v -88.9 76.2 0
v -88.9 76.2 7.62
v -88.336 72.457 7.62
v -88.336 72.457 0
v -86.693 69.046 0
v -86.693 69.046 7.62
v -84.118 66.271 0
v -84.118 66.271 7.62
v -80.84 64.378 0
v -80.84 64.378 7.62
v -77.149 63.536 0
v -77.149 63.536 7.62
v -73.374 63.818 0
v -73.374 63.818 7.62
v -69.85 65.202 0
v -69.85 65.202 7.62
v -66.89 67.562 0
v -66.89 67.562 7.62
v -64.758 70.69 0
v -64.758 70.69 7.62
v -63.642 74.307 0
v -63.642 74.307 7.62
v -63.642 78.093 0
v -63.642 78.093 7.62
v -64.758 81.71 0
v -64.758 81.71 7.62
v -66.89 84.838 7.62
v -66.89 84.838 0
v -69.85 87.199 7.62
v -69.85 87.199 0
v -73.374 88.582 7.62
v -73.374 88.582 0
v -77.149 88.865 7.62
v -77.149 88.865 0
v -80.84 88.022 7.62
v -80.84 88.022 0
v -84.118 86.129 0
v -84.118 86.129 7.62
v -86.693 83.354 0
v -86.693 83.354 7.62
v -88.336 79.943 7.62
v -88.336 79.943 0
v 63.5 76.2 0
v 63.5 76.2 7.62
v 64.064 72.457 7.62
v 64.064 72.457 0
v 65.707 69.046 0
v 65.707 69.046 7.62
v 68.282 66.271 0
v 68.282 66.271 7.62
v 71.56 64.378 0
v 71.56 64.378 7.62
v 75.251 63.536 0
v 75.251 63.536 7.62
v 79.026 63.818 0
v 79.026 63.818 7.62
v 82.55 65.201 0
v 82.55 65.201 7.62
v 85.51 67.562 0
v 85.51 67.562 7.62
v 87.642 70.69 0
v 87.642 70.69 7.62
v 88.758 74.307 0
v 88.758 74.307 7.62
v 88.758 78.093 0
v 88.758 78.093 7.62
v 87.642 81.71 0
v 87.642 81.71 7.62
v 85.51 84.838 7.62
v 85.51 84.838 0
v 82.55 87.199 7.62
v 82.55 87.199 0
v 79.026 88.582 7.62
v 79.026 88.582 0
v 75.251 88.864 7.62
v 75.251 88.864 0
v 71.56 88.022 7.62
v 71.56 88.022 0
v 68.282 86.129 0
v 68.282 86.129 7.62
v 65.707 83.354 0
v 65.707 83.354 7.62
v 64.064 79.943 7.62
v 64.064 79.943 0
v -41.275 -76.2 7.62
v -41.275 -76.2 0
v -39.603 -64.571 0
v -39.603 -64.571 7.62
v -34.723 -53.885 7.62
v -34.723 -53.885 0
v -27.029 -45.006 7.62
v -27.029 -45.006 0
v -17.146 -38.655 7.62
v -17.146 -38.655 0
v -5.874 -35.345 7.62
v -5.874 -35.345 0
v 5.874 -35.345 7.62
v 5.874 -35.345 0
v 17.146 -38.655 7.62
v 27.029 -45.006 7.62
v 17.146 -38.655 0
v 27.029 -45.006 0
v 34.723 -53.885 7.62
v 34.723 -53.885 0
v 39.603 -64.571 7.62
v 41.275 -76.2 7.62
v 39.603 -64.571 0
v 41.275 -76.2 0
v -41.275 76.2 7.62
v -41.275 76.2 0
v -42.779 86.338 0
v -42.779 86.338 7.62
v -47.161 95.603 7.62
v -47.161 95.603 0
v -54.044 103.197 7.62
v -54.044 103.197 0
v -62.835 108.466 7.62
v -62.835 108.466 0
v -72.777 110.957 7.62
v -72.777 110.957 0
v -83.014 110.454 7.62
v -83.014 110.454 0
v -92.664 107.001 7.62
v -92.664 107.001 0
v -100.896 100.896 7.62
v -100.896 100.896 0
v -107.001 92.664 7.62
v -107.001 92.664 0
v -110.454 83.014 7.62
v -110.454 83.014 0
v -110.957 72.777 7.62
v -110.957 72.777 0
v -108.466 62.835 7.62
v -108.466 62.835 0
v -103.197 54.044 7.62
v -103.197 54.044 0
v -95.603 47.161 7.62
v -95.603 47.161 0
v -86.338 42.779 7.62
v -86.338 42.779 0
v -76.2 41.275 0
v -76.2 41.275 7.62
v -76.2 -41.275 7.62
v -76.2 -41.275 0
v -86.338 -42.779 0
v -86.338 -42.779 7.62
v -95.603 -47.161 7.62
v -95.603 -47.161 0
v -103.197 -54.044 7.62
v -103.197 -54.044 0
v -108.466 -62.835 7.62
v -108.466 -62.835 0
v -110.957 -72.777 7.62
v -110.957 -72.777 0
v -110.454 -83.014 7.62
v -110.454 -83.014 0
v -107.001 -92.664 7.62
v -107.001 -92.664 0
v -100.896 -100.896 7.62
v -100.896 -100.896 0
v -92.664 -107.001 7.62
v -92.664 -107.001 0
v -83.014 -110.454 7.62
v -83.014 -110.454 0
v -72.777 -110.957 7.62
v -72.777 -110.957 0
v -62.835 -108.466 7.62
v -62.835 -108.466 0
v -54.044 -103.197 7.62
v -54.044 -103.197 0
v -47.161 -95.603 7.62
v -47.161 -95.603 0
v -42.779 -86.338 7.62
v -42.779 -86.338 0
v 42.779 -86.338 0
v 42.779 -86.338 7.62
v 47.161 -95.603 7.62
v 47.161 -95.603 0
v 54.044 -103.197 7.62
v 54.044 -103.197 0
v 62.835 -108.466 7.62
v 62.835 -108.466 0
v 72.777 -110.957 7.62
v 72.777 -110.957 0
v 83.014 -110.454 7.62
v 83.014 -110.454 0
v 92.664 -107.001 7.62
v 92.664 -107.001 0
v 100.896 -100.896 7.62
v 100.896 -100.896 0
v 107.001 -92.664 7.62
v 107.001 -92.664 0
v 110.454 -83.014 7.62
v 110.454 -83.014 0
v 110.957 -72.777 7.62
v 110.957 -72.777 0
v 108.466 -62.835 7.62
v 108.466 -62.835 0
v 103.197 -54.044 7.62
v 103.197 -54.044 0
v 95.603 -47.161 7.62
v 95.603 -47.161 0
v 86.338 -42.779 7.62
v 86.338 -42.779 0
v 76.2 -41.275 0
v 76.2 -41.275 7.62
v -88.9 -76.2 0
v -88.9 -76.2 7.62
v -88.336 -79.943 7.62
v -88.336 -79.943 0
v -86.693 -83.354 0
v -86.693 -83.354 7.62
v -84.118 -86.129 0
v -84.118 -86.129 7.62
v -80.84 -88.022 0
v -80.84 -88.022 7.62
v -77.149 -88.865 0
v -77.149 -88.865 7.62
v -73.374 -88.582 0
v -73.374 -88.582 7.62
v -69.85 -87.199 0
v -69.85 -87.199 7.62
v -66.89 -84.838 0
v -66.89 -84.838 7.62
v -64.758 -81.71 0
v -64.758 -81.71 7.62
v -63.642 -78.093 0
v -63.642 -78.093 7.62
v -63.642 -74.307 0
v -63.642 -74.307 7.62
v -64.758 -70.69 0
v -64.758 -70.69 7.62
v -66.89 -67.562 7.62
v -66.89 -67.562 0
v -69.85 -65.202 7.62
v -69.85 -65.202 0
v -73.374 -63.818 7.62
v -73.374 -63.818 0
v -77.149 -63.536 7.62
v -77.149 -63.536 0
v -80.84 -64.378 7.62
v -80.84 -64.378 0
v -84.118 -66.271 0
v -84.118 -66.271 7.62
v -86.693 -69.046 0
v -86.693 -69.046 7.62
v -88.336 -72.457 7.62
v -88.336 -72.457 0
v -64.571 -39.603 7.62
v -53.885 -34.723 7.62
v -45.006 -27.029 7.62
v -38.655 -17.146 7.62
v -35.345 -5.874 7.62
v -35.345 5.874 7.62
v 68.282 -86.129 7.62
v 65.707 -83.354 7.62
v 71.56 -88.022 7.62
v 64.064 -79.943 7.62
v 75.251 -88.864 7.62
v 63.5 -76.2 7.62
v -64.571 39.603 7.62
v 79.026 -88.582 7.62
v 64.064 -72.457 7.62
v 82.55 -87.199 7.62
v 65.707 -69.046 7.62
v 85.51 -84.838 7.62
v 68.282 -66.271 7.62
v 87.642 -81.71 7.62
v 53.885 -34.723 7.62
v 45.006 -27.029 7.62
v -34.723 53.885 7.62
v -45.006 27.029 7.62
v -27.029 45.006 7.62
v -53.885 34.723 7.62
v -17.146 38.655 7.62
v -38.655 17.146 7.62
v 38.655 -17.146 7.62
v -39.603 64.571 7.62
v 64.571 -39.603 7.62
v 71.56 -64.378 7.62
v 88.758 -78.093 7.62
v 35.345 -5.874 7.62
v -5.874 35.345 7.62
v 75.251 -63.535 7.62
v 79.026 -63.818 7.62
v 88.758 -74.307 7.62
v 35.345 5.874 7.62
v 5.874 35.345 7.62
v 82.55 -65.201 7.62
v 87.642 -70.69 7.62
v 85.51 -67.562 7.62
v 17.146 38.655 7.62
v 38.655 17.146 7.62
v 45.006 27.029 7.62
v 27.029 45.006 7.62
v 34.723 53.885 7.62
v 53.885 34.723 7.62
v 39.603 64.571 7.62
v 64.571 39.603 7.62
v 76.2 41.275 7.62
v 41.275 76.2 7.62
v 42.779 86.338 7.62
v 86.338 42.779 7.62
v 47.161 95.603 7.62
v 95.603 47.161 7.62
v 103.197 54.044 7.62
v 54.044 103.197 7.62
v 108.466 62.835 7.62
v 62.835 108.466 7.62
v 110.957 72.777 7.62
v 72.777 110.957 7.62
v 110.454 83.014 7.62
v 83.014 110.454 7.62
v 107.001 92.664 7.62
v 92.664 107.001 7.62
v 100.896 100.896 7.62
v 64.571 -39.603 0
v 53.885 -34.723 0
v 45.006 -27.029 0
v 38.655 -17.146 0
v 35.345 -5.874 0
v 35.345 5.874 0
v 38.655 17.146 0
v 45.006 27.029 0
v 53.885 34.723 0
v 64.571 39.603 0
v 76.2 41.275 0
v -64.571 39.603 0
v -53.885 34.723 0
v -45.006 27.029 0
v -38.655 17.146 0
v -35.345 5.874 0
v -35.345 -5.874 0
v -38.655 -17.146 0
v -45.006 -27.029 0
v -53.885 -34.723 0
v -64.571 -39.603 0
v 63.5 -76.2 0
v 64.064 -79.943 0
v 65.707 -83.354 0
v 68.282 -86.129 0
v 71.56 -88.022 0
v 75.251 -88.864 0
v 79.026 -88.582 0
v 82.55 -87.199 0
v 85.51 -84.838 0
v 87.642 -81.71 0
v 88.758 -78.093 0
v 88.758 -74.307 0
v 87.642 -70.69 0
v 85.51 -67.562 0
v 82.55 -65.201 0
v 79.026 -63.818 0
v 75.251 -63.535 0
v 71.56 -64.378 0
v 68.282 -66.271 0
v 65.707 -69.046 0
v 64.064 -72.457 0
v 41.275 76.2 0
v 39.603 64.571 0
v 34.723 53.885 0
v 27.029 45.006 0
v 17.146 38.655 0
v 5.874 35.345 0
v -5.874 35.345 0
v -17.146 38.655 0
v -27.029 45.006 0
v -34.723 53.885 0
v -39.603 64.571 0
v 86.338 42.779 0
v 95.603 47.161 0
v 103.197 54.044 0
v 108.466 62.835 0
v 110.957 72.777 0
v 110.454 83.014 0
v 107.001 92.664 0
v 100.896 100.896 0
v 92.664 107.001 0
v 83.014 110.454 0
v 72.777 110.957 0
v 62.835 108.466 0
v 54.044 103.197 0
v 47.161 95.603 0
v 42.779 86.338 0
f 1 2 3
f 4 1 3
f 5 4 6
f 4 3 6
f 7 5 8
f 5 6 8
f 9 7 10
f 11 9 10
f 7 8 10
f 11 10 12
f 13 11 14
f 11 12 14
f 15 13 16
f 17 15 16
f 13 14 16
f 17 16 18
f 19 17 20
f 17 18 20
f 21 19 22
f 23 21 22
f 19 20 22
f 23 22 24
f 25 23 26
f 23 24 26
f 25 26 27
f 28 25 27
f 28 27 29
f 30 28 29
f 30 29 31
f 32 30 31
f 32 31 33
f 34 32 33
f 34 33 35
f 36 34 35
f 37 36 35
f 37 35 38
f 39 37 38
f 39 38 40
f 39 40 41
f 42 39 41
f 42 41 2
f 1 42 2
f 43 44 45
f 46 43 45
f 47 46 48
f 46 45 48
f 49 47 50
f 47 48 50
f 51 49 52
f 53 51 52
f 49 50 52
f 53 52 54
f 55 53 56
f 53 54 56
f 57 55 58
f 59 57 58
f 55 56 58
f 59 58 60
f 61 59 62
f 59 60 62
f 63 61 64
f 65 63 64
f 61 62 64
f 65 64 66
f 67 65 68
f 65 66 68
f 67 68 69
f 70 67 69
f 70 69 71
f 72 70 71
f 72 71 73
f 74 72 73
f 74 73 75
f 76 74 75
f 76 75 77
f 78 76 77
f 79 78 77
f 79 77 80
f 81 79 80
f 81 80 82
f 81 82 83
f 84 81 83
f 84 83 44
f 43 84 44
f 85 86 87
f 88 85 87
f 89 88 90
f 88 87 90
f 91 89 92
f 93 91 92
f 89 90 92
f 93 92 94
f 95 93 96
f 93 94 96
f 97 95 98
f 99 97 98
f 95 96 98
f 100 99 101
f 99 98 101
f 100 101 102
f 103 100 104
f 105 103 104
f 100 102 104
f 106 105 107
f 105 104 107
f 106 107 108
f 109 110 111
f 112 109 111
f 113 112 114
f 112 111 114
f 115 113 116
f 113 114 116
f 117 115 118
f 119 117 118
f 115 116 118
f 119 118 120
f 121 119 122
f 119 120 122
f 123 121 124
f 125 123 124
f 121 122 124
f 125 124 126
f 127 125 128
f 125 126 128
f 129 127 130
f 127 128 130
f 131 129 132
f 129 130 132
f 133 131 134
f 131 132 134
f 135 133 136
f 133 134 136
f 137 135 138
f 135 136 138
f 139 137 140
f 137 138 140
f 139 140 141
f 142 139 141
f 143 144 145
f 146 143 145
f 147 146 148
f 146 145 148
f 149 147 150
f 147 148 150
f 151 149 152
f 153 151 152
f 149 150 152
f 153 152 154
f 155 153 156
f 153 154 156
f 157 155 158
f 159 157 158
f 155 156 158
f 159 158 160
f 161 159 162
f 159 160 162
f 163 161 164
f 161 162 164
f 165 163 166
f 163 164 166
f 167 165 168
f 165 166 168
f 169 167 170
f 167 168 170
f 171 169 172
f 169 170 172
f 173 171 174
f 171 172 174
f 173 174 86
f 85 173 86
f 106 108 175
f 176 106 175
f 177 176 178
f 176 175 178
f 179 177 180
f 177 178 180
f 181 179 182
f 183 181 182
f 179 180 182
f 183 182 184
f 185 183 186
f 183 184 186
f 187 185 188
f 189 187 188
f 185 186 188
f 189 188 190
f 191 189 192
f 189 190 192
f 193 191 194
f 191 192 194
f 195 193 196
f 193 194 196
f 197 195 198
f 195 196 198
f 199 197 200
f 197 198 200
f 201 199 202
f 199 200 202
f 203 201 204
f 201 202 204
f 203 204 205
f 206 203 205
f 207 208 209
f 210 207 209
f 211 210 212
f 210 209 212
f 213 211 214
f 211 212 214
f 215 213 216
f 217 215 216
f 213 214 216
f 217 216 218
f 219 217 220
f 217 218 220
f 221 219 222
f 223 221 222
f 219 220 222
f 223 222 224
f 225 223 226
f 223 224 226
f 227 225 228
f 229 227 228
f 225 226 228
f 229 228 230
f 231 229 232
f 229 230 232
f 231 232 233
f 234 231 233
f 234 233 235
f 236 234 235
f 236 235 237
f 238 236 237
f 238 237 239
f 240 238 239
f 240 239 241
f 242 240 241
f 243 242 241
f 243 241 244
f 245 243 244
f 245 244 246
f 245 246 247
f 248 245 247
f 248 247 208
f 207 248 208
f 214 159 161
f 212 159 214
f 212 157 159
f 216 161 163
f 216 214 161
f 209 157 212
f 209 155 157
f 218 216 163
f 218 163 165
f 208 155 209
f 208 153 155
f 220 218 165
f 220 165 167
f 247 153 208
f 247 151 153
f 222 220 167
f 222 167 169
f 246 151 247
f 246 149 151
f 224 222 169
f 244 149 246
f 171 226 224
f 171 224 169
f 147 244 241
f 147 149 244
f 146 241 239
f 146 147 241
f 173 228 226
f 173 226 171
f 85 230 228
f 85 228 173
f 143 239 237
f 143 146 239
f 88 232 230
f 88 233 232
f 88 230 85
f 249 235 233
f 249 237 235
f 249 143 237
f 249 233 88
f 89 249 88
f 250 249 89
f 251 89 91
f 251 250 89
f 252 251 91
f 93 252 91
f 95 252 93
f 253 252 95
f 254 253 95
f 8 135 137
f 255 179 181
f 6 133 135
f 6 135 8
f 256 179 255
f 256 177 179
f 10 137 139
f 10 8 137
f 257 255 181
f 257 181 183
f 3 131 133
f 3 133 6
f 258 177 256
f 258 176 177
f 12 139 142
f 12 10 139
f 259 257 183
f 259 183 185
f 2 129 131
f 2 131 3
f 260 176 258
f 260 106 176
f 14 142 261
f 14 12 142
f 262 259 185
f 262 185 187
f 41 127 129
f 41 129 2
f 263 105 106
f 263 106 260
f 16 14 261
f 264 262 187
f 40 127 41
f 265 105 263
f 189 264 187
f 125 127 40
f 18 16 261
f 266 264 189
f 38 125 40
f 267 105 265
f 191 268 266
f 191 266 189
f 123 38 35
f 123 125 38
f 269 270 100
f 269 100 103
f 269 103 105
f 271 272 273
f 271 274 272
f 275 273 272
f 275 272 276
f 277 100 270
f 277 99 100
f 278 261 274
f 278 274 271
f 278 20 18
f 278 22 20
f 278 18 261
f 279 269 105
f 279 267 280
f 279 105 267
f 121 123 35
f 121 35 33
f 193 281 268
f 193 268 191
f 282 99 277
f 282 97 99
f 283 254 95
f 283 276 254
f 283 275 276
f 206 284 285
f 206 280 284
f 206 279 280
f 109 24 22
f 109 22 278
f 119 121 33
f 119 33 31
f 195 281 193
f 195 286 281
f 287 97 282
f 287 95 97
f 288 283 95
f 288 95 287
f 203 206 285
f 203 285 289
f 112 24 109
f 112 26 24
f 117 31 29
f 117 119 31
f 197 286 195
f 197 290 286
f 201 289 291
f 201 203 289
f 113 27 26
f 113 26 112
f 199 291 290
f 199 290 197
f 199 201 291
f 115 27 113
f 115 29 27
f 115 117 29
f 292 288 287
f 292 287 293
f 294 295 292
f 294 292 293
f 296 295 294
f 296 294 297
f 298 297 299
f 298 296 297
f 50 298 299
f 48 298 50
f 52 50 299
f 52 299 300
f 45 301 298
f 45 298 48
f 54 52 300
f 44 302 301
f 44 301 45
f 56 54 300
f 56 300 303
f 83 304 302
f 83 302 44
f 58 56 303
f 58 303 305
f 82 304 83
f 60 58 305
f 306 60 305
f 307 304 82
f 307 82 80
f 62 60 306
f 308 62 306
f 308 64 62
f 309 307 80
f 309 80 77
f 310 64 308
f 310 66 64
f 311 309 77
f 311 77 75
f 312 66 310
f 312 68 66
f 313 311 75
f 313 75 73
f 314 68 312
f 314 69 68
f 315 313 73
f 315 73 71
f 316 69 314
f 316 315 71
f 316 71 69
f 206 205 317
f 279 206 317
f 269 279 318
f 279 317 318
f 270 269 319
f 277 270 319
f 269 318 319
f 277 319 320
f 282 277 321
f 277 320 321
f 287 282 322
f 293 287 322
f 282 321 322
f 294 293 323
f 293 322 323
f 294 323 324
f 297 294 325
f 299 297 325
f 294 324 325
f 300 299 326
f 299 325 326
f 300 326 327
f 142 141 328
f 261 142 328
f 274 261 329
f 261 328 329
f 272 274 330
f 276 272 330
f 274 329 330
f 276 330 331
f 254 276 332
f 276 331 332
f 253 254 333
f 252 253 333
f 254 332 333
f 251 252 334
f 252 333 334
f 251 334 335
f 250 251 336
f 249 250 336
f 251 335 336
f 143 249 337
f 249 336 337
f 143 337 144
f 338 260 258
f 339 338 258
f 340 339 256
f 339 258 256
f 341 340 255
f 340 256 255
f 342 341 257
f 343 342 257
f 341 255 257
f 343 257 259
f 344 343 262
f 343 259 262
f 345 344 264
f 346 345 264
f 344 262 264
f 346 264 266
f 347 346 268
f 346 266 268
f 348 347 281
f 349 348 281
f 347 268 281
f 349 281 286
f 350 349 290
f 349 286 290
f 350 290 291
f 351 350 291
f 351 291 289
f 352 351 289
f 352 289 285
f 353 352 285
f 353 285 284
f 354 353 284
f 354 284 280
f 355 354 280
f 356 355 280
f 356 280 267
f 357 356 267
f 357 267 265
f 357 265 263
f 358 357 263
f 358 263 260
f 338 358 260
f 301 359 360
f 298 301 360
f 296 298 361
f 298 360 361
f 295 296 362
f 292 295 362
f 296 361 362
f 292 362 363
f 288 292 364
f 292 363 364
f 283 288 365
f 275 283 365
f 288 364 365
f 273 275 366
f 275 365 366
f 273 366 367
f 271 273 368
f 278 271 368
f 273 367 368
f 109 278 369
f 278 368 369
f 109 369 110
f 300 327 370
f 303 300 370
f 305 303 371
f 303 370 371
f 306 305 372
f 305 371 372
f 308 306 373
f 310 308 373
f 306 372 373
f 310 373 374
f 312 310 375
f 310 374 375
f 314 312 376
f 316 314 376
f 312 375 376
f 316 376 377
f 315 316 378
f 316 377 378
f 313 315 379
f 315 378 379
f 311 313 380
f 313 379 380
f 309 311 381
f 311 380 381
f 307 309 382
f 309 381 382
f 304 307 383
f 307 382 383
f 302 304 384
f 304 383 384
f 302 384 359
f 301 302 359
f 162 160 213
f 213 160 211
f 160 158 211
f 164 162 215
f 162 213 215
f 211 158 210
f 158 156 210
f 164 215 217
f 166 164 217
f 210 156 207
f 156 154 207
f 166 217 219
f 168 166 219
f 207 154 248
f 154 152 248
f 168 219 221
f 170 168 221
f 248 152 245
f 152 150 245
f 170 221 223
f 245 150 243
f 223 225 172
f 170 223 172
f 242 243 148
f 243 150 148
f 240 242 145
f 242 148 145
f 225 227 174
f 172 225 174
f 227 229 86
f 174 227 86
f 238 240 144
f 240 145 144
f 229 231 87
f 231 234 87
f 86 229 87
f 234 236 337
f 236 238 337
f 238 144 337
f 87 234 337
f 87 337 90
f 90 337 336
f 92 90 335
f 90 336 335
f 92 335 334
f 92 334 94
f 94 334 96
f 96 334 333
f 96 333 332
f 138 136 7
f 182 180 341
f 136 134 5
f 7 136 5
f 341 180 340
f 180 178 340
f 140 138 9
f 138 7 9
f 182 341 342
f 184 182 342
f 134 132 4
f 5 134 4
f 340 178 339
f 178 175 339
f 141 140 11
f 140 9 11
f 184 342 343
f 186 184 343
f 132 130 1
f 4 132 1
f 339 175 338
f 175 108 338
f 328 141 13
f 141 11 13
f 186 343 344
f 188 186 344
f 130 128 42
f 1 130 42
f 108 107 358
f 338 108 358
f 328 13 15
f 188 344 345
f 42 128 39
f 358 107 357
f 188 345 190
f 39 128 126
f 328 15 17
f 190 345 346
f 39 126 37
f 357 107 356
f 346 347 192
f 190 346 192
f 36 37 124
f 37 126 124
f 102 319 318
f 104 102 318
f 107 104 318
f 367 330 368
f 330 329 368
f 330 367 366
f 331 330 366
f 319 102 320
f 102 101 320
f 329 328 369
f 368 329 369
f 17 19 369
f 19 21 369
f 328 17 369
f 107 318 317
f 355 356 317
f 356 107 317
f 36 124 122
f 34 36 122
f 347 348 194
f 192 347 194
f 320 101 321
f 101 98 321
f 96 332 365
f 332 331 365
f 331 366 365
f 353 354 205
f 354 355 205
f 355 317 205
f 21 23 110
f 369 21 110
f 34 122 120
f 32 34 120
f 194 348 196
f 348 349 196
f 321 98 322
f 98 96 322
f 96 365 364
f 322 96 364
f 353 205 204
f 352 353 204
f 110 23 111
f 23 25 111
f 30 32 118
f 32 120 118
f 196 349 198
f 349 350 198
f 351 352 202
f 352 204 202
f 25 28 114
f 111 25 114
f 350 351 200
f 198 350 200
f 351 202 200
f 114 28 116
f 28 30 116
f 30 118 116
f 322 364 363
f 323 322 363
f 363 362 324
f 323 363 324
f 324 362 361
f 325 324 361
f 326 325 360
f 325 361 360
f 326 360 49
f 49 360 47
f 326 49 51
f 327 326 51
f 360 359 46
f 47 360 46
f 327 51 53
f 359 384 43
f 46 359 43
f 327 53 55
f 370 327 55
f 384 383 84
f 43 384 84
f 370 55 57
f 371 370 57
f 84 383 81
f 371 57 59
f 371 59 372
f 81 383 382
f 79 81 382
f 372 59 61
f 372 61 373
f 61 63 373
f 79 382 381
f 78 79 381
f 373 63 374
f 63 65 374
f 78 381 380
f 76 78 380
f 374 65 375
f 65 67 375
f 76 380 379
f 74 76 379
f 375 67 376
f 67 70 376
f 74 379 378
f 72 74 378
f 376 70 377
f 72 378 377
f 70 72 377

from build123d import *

# Parameters (mm, degrees)
F1_DEPTH = 7.62
F3_D     = 25.4
F5_D     = 25.4


with BuildPart() as f1:
    # F0 (on Top) → F1 (new body)
    with BuildSketch(Plane.XY):
        with BuildLine():
            ThreePointArc((41.275, 76.2), (0, 34.925), (-41.275, 76.2))
            ThreePointArc((-41.275, 76.2), (-100.895704, 100.895704), (-76.2, 41.275))
            ThreePointArc((-76.2, 41.275), (-34.925, 0), (-76.2, -41.275))
            ThreePointArc((-76.2, -41.275), (-100.895704, -100.895704), (-41.275, -76.2))
            ThreePointArc((-41.275, -76.2), (0, -34.925), (41.275, -76.2))
            ThreePointArc((41.275, -76.2), (100.895704, -100.895704), (76.2, -41.275))
            ThreePointArc((76.2, -41.275), (34.925, 0), (76.2, 41.275))
            ThreePointArc((76.2, 41.275), (100.895704, 100.895704), (41.275, 76.2))
        make_face()
    extrude(amount=F1_DEPTH)

    # F3 (through all)
    with Locations(Plane(origin=(0, 0, 0), x_dir=(1, 0, 0), z_dir=(0, 0, -1))):
        with Locations((-76.199986, 76.200023)):
            Hole(F3_D / 2)

    # F5 (through all)
    with Locations(Plane(origin=(0, 0, 0), x_dir=(1, 0, 0), z_dir=(0, 0, -1))):
        with Locations((-76.199934, -76.200038), (76.200068, -76.200001), (76.200128, 76.199986)):
            Hole(F5_D / 2)


solid = f1.part
